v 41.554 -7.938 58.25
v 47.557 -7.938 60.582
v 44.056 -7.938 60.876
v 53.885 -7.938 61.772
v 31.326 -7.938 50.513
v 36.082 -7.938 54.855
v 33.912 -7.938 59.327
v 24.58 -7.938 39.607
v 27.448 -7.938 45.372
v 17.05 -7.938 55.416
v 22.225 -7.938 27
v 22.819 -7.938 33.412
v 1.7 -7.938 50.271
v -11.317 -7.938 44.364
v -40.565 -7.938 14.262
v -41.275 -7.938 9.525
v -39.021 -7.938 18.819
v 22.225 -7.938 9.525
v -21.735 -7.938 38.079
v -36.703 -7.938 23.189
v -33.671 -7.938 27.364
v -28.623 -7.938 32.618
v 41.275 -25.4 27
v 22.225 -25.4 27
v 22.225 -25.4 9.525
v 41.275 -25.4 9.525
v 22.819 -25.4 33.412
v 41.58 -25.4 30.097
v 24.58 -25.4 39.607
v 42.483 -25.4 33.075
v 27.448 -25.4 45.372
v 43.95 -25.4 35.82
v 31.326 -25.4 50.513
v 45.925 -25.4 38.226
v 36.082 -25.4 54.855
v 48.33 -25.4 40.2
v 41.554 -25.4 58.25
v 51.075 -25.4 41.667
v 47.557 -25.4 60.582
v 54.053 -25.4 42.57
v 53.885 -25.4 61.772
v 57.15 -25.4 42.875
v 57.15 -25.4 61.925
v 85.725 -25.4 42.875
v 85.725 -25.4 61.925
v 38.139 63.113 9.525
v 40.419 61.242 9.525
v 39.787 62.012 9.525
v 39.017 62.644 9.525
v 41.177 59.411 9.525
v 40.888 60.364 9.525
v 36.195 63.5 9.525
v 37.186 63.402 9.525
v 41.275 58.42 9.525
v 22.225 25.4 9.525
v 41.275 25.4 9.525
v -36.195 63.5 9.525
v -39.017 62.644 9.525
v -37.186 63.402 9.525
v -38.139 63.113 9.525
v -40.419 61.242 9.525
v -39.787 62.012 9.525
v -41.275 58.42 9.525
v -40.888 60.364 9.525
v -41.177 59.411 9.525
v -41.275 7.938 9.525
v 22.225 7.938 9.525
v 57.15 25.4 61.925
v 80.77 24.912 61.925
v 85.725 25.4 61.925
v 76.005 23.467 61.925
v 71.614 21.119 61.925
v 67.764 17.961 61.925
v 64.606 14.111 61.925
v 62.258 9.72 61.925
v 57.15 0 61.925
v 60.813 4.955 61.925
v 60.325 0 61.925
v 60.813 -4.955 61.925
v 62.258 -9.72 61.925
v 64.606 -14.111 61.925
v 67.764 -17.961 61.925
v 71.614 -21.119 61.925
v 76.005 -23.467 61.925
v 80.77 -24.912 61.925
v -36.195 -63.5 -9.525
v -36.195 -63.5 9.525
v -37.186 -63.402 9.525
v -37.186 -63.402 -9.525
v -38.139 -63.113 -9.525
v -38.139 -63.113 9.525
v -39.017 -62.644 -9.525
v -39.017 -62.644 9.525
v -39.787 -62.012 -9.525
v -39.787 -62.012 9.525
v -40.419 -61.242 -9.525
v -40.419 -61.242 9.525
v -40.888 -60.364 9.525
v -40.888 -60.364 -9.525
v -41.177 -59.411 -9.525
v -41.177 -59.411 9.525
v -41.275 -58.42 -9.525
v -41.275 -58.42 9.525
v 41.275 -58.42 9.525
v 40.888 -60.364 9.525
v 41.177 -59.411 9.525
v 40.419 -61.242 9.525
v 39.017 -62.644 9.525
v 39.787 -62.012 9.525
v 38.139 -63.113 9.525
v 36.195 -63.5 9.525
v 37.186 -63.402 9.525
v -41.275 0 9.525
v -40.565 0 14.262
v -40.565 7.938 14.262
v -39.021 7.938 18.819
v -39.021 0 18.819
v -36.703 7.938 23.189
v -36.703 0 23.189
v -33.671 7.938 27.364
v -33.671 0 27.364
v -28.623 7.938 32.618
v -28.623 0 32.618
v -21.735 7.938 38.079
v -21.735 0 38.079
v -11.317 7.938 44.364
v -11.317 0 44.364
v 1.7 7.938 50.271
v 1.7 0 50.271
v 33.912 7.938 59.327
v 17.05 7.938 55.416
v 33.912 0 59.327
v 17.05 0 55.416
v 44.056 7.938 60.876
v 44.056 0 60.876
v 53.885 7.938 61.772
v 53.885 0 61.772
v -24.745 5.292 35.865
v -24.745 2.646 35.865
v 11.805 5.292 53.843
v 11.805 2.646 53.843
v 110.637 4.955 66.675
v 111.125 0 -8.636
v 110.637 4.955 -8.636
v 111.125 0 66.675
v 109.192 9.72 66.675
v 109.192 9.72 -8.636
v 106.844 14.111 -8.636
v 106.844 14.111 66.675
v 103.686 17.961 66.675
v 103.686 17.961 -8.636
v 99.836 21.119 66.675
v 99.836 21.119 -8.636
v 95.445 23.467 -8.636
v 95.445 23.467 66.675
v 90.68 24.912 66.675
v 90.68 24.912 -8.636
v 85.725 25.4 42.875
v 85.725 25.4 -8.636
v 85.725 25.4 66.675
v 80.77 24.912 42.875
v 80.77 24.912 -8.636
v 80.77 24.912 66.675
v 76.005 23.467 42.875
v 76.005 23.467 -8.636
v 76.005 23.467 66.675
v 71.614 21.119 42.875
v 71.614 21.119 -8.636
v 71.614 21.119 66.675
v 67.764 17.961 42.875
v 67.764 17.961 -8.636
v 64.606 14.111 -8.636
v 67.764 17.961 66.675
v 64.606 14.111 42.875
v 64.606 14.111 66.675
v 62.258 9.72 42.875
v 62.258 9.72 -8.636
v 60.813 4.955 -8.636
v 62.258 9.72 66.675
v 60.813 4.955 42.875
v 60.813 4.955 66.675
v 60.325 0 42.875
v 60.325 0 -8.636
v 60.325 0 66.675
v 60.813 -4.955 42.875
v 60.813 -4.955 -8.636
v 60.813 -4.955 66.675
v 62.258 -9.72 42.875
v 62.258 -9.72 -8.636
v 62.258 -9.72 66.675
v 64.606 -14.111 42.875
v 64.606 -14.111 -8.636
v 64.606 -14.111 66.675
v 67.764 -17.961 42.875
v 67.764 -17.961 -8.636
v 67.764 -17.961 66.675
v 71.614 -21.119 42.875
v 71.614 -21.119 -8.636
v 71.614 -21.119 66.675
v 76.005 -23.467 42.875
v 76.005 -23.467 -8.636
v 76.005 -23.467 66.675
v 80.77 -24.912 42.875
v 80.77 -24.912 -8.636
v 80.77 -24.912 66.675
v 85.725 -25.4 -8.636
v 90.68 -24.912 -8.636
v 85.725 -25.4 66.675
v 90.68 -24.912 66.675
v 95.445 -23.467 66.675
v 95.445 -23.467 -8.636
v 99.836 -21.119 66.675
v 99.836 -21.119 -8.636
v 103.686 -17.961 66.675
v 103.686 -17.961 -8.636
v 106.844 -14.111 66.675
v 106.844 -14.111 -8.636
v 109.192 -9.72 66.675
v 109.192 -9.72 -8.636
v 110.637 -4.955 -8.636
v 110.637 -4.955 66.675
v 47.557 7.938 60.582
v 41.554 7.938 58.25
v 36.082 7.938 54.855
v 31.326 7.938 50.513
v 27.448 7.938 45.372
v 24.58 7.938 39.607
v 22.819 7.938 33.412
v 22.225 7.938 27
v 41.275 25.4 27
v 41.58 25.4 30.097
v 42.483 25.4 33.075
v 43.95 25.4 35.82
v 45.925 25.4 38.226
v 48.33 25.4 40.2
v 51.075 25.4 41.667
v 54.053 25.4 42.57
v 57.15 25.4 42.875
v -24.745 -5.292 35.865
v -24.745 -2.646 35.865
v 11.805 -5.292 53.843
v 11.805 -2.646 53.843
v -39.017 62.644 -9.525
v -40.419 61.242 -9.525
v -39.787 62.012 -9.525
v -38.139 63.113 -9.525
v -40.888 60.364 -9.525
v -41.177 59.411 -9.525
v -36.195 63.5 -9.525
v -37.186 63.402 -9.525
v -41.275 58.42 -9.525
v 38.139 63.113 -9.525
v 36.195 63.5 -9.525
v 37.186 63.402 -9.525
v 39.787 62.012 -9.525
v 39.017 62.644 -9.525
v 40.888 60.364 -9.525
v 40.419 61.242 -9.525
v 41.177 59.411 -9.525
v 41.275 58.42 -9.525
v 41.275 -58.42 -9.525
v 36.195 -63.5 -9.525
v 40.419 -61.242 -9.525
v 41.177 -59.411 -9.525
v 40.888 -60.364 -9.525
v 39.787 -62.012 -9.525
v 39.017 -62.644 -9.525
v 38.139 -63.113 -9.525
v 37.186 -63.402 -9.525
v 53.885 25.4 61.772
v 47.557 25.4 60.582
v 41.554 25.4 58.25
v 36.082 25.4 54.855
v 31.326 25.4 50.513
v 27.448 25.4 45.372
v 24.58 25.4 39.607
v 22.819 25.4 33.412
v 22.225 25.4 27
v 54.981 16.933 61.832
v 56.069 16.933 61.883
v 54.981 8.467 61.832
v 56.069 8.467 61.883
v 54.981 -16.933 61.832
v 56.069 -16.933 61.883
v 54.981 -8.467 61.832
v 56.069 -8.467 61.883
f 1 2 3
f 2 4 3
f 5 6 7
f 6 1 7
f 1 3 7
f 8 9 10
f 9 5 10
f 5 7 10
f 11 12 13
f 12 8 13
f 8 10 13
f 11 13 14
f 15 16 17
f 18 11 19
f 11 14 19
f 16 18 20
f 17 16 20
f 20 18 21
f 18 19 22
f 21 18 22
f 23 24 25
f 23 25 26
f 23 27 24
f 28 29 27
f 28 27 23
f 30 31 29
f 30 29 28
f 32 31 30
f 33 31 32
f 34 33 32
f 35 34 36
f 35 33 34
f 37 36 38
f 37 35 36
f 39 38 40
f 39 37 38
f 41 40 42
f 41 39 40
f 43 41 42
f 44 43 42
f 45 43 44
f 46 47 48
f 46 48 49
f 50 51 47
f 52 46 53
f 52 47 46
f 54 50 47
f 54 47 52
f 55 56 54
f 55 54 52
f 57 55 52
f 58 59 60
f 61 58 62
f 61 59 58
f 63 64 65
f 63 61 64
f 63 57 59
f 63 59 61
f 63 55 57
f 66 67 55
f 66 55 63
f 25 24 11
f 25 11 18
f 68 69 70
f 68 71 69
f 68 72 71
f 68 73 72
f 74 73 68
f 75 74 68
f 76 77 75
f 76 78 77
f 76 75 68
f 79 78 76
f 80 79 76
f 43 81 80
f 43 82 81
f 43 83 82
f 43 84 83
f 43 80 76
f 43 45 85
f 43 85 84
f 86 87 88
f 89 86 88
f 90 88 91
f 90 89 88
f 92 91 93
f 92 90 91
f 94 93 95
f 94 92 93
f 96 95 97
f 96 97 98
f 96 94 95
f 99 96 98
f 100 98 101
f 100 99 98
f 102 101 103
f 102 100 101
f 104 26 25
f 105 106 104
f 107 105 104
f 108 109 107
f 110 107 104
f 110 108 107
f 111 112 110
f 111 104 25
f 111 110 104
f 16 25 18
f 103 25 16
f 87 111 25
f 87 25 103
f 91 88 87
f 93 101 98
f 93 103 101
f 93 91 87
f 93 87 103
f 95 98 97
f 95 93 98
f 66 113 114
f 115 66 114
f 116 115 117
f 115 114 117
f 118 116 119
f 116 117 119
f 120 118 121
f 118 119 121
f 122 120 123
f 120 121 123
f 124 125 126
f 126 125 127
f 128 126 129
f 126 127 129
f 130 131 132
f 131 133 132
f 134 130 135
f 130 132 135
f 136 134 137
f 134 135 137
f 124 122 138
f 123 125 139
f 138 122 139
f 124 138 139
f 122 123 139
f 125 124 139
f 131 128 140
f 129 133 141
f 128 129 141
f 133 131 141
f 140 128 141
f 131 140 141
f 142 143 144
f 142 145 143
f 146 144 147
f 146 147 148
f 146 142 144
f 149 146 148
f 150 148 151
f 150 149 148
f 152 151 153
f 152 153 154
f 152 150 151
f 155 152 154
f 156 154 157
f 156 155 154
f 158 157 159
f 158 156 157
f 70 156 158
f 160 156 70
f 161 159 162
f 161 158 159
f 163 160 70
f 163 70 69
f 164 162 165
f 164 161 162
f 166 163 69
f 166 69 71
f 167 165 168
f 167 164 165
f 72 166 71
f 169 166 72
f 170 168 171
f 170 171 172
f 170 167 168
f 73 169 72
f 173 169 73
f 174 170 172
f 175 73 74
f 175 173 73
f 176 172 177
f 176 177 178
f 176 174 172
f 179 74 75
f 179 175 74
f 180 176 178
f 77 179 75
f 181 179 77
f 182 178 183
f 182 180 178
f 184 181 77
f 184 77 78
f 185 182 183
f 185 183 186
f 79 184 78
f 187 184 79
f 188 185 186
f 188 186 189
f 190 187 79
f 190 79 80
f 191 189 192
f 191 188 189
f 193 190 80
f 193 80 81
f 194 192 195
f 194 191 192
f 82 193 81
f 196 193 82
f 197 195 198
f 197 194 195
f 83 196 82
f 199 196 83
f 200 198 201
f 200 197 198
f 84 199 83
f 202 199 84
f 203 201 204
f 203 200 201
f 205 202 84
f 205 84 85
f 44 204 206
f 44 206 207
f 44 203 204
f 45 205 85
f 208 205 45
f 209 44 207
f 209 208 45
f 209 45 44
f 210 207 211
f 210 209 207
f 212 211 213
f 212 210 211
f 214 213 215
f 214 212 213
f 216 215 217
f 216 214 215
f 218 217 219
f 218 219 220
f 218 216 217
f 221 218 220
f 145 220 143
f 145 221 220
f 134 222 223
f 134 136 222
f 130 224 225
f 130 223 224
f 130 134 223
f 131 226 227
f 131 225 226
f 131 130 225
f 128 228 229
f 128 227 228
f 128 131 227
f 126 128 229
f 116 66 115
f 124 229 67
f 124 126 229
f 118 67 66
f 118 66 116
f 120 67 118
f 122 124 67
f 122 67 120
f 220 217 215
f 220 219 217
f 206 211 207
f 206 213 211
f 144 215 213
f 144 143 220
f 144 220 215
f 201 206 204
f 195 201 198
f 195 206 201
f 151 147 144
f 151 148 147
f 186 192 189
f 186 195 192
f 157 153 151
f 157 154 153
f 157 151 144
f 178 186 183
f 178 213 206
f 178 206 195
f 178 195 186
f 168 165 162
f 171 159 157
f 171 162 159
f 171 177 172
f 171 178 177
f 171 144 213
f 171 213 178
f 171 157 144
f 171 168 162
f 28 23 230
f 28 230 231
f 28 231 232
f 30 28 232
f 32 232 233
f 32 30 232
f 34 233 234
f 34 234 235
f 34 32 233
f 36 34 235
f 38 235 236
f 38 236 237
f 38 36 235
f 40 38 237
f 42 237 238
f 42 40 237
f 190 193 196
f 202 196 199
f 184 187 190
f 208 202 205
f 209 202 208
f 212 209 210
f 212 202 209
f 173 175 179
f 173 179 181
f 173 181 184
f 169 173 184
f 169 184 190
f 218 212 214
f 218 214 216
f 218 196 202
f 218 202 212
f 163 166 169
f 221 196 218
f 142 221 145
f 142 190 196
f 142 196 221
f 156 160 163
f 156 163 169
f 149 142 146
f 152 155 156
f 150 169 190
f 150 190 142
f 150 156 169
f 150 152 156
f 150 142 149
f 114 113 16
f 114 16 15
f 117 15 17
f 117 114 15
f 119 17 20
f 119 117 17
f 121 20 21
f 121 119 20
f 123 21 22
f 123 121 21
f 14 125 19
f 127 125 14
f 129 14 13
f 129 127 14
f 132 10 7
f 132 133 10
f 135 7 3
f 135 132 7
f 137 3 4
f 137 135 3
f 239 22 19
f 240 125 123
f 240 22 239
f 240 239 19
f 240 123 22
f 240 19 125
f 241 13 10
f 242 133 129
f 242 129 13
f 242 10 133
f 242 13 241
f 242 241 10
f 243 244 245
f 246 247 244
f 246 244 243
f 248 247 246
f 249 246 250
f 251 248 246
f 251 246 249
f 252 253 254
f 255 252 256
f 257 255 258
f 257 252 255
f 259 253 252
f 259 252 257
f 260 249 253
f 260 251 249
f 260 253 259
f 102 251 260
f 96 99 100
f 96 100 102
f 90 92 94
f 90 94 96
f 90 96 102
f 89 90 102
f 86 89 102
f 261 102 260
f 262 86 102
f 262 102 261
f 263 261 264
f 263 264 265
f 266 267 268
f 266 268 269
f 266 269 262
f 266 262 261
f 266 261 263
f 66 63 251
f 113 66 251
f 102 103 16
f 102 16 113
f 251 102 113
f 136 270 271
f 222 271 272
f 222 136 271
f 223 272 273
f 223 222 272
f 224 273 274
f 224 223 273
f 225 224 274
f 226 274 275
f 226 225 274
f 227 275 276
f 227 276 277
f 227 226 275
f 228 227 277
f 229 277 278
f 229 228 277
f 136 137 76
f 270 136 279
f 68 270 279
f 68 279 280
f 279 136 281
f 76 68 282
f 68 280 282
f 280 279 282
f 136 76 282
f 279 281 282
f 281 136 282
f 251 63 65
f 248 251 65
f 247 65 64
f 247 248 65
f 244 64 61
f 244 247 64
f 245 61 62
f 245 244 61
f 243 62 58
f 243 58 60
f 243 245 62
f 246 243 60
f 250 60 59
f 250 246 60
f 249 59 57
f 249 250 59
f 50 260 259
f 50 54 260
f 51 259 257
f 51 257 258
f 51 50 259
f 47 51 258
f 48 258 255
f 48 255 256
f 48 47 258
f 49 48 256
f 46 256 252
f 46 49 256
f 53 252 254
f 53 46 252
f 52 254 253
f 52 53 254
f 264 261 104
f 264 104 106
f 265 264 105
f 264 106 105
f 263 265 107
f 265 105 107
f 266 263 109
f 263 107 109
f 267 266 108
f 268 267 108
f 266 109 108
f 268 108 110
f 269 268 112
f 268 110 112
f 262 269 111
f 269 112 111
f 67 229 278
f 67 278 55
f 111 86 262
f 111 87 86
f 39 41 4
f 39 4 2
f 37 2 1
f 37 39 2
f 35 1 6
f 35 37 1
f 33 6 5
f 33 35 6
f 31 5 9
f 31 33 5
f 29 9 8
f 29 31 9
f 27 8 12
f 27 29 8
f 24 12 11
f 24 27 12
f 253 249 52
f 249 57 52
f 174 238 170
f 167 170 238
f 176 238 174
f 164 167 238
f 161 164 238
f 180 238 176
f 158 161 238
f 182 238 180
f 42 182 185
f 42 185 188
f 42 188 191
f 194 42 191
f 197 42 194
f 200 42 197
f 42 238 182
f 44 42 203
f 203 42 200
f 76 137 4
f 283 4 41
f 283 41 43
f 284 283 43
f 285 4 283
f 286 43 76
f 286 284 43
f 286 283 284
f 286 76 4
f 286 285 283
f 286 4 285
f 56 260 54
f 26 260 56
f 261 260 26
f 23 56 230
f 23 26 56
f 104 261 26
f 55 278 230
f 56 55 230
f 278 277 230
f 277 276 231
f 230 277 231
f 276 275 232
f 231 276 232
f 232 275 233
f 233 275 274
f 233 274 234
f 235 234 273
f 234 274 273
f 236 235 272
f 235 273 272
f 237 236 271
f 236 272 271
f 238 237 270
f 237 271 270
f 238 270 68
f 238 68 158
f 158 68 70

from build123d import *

# Parameters (mm, degrees)
F1_DEPTH = 63.5
F0_W     = 25.4
F0_H     = 19.05
F2_DEPTH = 25.4
F3_DEPTH = 7.9375
F5_R     = 5.08
F6_DEPTH = 46.736


with BuildPart() as f1:
    # F0 (on Front) → F1 (new body, symmetric)
    with BuildSketch(Plane.XZ):
        Polygon((22.225, 9.525), (-41.275, 9.525), (-41.275, -9.525), (41.275, -9.525), (41.275, 9.525), align=None)
    extrude(amount=F1_DEPTH, both=True)

    # F0 (on Front) → F2 (join, symmetric)
    with BuildSketch(Plane.XZ):
        with BuildLine():
            Line((22.225, 27.0002), (22.225, 9.525))
            Line((22.225, 9.525), (41.275, 9.525))
            Line((41.275, 9.525), (41.275, 27.0002))
            ThreePointArc((41.275, 27.0002), (45.9246798487, 38.2255201513), (57.15, 42.8752))
            Line((57.15, 42.8752), (60.325, 42.8752))
            Line((60.325, 42.8752), (60.325, 61.9252))
            Line((60.325, 61.9252), (57.15, 61.9252))
            add(Edge.make_bspline(
                [(53.8854342407, 61.7722898912), (54.9842067368, 61.8365871986), (56.0728453275, 61.8876096574), (57.15, 61.9252)],
                knots=[108.5245810491, 108.5245810491, 108.5245810491, 108.5245810491, 111.5045361635, 111.5045361635, 111.5045361635, 111.5045361635], degree=3))
            ThreePointArc((53.8854342407, 61.7722898912), (31.3258777096, 50.5133948686), (22.225, 27.0002))
        make_face()
        with Locations((73.025, 52.4002)):
            Rectangle(F0_W, F0_H)
    extrude(amount=F2_DEPTH, both=True)

    # F0 (on Front) → F3 (join, symmetric)
    with BuildSketch(Plane.XZ):
        with BuildLine():
            add(Edge.make_bspline(
                [(-41.275, 9.525), (-39.5856284224, 39.4828766469), (13.870125209, 59.4306981306), (53.8854342407, 61.7722898912)],
                knots=[0, 0, 0, 0, 108.5245810491, 108.5245810491, 108.5245810491, 108.5245810491], degree=3))
            Line((-41.275, 9.525), (22.225, 9.525))
            Line((22.225, 9.525), (22.225, 27.0002))
            ThreePointArc((22.225, 27.0002), (31.3258777096, 50.5133948686), (53.8854342407, 61.7722898912))
        make_face()
    extrude(amount=F3_DEPTH, both=True)

    # F0 (on Front) → F4 (revolve)
    with BuildSketch(Plane.XZ):
        Polygon((85.725, 66.675), (85.725, 61.9252), (85.725, 42.8752), (85.725, 38.1), (111.125, 38.1), (111.125, 66.675), align=None)
    revolve(axis=Axis((85.725, 0, 52.3875), (0, 0, 1)))

    # F5
    f5_edges = [f1.edges().sort_by_distance(p)[0] for p in [
        (41.275, -63.5, 0),
        (-41.275, -63.5, 0),
        (41.275, 63.5, 0),
        (-41.275, 63.5, 0),
    ]]
    fillet(f5_edges, radius=F5_R)

    # F6 (add): a face of the model
    f6_faces = [f1.faces().sort_by_distance(p)[0] for p in [
        (85.725, 0, 38.1),
    ]]
    extrude(f6_faces, amount=F6_DEPTH)


solid = f1.part
